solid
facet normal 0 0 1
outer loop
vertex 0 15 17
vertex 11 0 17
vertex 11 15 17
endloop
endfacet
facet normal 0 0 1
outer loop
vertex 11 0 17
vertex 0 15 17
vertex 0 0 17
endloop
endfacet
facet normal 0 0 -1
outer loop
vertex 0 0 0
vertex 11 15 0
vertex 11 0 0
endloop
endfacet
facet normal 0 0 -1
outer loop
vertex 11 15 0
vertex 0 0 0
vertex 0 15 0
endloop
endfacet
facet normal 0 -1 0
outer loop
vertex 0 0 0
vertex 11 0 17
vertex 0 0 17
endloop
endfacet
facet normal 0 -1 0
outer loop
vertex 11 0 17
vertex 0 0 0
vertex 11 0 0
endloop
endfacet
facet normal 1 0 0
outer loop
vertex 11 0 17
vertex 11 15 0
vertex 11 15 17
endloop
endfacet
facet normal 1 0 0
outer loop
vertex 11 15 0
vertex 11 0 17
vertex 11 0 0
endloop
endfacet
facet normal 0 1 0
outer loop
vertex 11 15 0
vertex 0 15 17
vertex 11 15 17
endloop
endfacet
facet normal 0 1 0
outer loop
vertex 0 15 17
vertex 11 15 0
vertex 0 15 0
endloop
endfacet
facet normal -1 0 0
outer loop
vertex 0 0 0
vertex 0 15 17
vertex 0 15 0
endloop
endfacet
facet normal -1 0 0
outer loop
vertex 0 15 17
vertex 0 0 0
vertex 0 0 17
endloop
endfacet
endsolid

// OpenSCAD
// Generated by SolidPython 1.0.1 on 2020-07-29 00:46:55


cube(size = [11, 15, 17]);
/***********************************************
*********      SolidPython code:      **********
************************************************
 
# import packages: SolidPython
from solid import *
from solid.utils import *
from itertools import chain, combinations, permutations


class Resize:

    def __init__(self, scad_file):
        self.scad_file = scad_file
        #self.scad_file = import_scad(scad_file)
        # cone/cylinder param:
        self.r1 = 0
        self.r2 = 0
        self.h = 0
        # rectangular prism param:
        self.w = 0
        self.l = 0
        # ellipse param:
        self.r = 0

    # import OpenScad code (file name corresponds to shape)


    # classify shape + parameters
    def assign(self, param1, param2, param3):
        if self.scad_file == 'cone.scad':
            self.r1 = param1
            self.r2 = param2
            self.h = param3
        elif self.scad_file == 'cylinder.scad':
            self.r1 = param1
            self.r2 = param2
            self.h = param3
        elif self.scad_file == 'rectangularPrism.scad':
            self.h = param1
            self.l = param2
            self.w = param3
        else:
            self.r = param1
            self.h = param2

    # resize parameters
    def iterate(self):
        x = range(3, 20, 2)
        i = 1
        if self.scad_file == 'cone.scad':
            tempList = list(permutations(x, 2))
            for temp in tempList:
                param1 = temp[0]
                param2 = temp[1]
                filepath = 'produced_scad_files/' + 'cone' + str(param1) + '_' + str(param2) + '_' + '.scad'
                scad_render_to_file(cylinder(h=param1, r1=param2, r2=0), filepath)

        elif self.scad_file == 'cylinder.scad':
            tempList = list(permutations(x, 3))
            for temp in tempList:
                param1 = temp[0]
                param2 = temp[1]
                filepath = 'produced_scad_files/' + 'cylinder' + str(param1) + '_' + str(param2) + '_' + '.scad'
                scad_render_to_file(cylinder(h=param1, r1=param2, r2=param2), filepath)

        elif self.scad_file == 'rectangularPrism.scad':
            tempList = list(permutations(x, 3))
            for temp in tempList:
                param1 = temp[0]
                param2 = temp[1]
                param3 = temp[2]
                filepath = 'produced_scad_files/' + 'rectangularPrism' + str(param1) + '_' + str(param2) + '_' + str(
                    param3) + '.scad'
                scad_render_to_file(cube(size=(param1, param2, param3)), filepath)

        elif self.scad_file == 'ellipse.scad':
            tempList = list(permutations(x, 4))
            for temp in tempList:
                param1 = temp[0]
                param2 = temp[1]
                param3 = temp[2]
                param4 = temp[3]
                filepath = 'produced_scad_files/' + 'ellipse' + str(param1) + '_' + str(param2) + '_' + str(param3) + '_' + str(param4) + '.scad'
                scad_render_to_file(scale([param1, param2, param3])(sphere(r=param4)), filepath)

    def render_to_scadfile(self):
        scad_render_to_file(scad, 'example.scad') 
 
************************************************/
